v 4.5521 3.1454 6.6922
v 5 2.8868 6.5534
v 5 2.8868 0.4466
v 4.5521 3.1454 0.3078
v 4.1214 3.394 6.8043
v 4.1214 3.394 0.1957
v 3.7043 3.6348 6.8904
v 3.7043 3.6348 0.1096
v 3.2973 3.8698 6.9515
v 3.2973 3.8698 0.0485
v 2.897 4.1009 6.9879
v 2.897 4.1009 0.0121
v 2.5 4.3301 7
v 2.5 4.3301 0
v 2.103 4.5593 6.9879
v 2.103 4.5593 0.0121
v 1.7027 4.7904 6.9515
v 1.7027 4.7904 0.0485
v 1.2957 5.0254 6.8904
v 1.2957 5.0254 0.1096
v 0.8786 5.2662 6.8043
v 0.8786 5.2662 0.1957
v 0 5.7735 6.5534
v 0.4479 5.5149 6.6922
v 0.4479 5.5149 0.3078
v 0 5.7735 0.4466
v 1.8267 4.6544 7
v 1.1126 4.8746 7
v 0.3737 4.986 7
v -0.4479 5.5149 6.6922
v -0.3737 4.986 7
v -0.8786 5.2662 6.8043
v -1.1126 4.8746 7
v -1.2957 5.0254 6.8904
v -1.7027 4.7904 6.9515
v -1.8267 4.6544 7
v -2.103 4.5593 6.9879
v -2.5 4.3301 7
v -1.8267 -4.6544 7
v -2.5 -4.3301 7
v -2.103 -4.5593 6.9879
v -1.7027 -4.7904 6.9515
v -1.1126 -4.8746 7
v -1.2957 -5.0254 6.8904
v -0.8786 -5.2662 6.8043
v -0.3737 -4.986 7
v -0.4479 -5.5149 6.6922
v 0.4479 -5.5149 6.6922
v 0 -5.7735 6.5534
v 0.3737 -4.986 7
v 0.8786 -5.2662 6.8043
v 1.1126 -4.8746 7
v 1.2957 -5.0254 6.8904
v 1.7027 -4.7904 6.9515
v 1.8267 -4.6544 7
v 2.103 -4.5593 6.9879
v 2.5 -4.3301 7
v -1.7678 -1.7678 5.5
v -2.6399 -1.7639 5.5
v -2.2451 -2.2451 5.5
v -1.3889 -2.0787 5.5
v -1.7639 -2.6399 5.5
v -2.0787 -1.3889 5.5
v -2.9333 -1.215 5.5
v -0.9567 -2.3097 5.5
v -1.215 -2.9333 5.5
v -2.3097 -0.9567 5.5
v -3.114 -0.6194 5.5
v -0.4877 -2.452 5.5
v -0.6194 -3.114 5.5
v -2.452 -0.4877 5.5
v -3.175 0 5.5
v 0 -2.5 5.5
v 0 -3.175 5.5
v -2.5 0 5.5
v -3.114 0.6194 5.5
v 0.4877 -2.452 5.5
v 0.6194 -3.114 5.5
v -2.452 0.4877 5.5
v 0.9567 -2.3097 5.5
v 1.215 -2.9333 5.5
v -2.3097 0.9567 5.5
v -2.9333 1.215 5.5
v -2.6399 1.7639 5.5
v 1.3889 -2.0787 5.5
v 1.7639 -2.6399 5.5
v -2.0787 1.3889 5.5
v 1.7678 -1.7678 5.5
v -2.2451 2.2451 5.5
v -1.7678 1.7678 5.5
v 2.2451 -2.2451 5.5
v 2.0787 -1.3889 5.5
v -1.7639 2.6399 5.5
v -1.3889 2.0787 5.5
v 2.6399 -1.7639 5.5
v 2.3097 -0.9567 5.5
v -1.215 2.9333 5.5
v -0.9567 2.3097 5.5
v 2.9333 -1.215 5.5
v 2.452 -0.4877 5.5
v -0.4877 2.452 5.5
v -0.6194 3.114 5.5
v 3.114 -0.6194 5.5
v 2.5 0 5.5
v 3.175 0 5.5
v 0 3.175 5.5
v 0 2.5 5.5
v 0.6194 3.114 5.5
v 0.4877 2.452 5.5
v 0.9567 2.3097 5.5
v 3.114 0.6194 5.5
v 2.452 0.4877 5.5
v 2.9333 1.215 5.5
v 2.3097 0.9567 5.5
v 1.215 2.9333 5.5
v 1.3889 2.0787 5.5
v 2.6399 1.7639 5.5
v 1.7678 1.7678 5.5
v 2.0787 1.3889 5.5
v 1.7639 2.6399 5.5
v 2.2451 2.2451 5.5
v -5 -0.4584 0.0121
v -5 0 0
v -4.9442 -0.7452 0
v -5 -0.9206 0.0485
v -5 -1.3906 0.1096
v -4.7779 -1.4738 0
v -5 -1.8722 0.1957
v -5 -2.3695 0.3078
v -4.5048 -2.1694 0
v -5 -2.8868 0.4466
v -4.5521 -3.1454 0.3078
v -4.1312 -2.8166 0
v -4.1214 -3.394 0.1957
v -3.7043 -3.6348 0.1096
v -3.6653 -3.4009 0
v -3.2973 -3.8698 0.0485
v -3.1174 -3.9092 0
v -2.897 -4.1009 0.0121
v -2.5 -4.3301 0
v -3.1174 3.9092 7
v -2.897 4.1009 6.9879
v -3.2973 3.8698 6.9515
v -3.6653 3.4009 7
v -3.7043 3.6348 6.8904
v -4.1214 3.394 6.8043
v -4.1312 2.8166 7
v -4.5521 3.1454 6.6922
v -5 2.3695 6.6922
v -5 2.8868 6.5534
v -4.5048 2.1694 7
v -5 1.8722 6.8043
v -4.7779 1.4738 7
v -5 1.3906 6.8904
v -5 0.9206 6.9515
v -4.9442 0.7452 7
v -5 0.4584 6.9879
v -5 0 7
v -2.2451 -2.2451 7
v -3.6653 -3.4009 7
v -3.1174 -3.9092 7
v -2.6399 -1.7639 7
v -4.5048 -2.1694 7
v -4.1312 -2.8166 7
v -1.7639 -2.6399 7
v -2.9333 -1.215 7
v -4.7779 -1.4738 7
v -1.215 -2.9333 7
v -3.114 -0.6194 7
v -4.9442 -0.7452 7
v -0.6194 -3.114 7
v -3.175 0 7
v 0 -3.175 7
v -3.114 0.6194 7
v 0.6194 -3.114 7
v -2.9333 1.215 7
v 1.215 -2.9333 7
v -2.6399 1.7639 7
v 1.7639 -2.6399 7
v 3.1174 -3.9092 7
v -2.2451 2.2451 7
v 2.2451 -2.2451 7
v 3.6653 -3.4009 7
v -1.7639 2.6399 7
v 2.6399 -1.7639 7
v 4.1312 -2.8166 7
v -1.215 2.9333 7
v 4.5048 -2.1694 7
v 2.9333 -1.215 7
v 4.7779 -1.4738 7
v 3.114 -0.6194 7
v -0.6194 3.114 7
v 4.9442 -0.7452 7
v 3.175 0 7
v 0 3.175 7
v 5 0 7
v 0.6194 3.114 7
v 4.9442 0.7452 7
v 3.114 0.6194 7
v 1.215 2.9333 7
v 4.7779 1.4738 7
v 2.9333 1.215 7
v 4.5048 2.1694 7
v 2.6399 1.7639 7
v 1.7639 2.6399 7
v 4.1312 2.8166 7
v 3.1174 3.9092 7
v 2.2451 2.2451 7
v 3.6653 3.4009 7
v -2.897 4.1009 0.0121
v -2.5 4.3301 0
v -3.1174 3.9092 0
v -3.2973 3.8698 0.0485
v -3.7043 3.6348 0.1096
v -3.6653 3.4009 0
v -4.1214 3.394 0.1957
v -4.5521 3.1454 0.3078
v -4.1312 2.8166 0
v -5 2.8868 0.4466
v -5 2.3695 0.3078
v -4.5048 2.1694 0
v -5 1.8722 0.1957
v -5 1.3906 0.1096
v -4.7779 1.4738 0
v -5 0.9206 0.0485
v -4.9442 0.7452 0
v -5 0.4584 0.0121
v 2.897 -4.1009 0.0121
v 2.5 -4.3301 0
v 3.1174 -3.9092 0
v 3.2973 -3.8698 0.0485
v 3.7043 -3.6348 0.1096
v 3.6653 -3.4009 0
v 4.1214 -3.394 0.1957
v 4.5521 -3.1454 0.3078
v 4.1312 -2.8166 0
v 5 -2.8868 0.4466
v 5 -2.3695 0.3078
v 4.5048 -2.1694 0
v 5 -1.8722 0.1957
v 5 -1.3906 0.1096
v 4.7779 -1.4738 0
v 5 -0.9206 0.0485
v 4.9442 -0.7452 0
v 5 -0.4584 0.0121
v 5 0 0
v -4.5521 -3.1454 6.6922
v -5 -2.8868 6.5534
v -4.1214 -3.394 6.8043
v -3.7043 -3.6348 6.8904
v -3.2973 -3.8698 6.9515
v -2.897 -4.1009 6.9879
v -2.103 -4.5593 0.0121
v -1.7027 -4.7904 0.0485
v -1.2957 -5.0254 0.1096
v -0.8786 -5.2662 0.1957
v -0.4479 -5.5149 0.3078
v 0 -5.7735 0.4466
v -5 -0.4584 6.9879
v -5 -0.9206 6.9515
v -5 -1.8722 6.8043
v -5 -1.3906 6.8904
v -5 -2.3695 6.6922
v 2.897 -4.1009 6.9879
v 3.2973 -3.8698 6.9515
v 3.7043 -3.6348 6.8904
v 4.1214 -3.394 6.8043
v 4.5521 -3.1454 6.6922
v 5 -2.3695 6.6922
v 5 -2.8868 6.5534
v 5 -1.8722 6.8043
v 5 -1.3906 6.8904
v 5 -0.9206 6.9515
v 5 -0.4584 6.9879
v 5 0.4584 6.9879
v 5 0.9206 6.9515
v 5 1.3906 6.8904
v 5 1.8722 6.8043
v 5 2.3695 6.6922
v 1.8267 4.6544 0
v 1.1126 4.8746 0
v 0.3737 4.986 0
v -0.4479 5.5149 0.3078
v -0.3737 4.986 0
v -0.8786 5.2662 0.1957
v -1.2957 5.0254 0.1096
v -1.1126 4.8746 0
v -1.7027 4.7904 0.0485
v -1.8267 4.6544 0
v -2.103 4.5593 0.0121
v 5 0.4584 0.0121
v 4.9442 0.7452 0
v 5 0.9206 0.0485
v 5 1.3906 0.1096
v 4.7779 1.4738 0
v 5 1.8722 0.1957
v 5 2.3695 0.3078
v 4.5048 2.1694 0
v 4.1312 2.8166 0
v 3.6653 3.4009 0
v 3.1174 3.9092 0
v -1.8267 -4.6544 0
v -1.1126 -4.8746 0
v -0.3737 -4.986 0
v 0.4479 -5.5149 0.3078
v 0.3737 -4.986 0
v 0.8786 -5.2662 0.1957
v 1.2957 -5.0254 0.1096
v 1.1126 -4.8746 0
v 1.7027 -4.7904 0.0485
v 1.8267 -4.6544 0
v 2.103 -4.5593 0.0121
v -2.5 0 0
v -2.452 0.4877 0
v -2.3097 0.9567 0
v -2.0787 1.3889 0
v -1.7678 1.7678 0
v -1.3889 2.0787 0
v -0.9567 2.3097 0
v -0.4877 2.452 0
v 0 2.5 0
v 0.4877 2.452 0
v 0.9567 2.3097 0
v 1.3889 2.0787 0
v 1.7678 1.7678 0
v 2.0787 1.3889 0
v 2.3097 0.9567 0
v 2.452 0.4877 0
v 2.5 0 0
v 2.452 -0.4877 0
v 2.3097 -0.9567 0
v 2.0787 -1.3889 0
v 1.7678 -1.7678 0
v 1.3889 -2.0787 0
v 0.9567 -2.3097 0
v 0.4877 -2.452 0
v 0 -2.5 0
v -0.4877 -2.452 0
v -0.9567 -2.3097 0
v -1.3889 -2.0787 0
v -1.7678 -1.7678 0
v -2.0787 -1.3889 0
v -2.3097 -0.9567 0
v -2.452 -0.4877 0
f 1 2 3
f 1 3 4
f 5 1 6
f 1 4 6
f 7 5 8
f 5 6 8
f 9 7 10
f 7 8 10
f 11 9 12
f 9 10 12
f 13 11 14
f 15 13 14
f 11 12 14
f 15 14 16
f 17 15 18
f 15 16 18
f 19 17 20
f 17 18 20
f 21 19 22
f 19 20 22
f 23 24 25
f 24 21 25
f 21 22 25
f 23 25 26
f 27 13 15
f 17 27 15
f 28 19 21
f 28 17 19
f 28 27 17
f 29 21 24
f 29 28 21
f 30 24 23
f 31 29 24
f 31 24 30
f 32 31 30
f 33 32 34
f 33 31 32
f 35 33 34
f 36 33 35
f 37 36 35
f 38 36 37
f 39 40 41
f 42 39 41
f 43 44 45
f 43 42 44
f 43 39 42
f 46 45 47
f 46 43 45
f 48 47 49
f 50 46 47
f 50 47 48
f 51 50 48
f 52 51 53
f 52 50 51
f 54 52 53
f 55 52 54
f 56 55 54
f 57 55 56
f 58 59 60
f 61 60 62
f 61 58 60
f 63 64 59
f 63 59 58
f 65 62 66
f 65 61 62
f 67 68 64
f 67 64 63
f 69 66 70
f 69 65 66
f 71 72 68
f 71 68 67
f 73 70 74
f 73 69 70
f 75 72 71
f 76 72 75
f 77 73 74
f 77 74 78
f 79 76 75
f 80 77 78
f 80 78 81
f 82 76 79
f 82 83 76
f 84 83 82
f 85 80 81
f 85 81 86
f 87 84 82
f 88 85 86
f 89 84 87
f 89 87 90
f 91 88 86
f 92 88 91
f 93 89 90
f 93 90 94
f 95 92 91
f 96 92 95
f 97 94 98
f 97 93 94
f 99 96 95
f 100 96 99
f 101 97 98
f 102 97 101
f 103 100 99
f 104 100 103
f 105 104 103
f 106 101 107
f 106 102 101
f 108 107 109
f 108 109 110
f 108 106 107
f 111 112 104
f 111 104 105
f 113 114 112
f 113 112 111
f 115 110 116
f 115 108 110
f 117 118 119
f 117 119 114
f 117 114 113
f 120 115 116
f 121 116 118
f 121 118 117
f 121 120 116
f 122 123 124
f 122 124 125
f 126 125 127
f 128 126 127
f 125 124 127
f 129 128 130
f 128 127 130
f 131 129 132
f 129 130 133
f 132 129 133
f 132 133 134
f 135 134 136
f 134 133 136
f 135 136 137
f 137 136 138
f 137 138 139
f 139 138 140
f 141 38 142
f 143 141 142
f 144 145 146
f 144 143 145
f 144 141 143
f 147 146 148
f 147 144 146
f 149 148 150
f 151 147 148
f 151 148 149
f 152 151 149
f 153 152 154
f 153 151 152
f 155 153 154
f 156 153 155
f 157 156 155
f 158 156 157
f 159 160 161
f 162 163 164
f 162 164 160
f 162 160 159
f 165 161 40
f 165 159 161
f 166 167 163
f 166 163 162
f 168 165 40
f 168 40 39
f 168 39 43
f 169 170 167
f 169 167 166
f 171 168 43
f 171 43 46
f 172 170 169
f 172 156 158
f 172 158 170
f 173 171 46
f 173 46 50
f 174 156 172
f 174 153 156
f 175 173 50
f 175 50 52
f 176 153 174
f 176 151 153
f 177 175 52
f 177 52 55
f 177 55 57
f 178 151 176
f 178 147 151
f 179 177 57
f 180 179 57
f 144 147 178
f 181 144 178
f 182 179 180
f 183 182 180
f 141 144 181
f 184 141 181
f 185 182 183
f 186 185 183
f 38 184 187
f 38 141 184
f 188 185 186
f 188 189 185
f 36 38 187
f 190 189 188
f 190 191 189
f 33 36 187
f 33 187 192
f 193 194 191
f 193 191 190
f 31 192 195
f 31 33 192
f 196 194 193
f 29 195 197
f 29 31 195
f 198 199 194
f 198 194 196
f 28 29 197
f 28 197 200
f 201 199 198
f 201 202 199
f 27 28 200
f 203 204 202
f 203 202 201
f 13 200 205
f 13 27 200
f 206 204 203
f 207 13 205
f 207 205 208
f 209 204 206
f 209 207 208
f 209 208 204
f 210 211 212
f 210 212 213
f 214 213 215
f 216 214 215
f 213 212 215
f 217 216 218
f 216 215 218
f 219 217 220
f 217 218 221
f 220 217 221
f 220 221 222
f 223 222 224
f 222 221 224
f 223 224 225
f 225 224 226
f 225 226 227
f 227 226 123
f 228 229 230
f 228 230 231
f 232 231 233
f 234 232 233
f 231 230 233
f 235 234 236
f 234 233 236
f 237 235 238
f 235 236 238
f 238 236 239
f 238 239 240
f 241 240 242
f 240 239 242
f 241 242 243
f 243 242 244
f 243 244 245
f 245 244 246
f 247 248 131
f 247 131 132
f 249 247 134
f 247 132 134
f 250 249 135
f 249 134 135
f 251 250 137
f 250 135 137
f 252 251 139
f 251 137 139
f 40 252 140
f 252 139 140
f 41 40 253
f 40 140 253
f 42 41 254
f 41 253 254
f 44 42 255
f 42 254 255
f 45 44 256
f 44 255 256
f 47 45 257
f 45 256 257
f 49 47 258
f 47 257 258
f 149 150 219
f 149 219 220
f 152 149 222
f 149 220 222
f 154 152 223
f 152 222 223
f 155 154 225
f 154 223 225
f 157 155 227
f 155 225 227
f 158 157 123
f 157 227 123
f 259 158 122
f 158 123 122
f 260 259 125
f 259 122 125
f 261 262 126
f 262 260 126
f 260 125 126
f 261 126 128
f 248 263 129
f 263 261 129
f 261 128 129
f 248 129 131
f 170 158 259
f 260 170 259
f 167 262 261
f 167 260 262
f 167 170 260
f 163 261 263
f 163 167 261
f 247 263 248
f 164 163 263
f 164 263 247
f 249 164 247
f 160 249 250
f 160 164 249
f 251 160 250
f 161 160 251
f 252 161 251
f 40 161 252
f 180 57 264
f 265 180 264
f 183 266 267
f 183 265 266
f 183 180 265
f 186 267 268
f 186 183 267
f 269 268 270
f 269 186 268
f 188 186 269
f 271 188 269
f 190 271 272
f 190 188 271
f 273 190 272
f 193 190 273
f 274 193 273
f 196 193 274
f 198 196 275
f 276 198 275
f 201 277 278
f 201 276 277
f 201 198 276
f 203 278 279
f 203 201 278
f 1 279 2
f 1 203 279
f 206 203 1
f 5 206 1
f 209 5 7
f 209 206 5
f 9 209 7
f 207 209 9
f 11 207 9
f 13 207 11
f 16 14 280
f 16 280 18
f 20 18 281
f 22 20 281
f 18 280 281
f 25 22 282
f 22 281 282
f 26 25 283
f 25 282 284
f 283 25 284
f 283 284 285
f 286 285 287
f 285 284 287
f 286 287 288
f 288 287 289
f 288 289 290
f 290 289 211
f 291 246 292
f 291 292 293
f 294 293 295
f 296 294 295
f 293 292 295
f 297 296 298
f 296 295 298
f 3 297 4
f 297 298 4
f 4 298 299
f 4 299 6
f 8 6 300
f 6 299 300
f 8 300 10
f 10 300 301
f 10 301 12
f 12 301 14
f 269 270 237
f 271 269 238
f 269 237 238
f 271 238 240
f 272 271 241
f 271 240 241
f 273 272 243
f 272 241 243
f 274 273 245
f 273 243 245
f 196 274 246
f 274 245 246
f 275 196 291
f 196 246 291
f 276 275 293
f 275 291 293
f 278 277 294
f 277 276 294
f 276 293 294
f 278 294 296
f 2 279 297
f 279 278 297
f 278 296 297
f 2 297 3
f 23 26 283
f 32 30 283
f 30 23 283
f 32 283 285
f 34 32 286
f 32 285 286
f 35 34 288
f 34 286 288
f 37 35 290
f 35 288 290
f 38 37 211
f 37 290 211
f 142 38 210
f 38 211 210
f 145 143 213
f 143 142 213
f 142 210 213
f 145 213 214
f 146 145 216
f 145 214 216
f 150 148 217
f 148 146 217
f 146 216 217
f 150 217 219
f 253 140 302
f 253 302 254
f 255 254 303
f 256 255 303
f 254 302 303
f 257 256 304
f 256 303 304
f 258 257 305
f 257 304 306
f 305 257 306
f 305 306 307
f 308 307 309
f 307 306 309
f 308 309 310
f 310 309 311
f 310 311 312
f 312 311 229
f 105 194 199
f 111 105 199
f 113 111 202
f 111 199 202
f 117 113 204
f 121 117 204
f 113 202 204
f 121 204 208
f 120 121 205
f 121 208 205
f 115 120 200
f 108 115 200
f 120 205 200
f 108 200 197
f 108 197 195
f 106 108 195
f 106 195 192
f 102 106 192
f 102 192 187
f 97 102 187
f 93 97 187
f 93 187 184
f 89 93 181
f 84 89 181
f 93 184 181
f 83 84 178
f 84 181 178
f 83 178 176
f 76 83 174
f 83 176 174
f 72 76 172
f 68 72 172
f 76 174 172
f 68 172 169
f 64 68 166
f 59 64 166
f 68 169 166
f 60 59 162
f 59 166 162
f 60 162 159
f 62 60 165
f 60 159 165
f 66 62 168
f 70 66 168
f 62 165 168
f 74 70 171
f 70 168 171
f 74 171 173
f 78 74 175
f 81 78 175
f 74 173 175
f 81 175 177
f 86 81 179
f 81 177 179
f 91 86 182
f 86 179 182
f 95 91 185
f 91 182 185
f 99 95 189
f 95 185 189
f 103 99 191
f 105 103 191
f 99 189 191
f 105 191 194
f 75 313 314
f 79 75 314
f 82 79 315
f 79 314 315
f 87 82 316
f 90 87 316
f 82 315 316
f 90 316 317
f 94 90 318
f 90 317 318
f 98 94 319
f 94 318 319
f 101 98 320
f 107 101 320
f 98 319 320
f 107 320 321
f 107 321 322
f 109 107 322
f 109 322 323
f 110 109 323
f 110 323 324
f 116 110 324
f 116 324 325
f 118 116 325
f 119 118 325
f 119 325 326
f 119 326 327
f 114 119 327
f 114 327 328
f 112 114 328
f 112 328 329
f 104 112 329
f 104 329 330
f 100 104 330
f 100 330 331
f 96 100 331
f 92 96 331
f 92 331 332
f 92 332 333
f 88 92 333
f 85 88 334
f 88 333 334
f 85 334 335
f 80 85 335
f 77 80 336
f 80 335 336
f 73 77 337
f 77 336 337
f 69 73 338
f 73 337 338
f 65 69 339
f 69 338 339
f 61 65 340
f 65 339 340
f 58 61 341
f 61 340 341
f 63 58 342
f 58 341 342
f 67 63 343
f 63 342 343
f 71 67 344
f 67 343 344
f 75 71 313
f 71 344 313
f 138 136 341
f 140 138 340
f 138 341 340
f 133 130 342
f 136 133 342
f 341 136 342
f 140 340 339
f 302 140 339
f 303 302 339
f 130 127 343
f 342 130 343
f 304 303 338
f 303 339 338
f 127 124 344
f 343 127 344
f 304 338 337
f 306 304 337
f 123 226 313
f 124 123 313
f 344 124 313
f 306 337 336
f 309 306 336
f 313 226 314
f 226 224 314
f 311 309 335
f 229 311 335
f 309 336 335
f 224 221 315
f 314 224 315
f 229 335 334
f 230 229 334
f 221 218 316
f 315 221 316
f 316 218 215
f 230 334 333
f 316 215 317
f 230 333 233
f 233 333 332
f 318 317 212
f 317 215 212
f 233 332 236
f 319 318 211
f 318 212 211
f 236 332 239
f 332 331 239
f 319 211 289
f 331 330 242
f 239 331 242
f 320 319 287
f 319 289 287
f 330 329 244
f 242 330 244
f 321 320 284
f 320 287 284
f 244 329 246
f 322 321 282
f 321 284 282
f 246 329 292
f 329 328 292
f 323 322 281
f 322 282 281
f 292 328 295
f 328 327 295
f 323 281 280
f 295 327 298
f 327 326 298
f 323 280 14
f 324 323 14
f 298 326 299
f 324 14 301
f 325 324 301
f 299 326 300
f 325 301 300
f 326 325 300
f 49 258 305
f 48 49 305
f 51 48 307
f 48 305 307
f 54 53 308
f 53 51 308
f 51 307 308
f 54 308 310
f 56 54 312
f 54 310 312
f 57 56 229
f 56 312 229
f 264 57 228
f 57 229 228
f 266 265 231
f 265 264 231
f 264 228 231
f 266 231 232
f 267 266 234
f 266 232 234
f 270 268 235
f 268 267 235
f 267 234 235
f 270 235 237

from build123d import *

# Parameters (mm, degrees)
BOSS_EXTRUDE1_DEPTH       = 7
M6X1_0_TAPPED_HOLE1_D     = 5
M6X1_0_TAPPED_HOLE1_DEPTH = 15
M6X1_0_TAPPED_HOLE1_TIP   = 1.502151548
SKETCH5_R                 = 3.175
CUT_EXTRUDE1_DEPTH        = 1.5


with BuildPart() as part:
    # Sketch1 → Boss-Extrude1 (new body)
    with BuildSketch(Plane.XY):
        Polygon((0, 5.773502692), (-5, 2.886751346), (-5, -2.886751346), (0, -5.773502692), (5, -2.886751346), (5, 2.886751346), align=None)
    extrude(amount=BOSS_EXTRUDE1_DEPTH)

    # M6x1.0 Tapped Hole1
    with Locations(Plane.XY.offset(7)):
        with Locations((0, 0)):
            Hole(M6X1_0_TAPPED_HOLE1_D / 2, depth=M6X1_0_TAPPED_HOLE1_DEPTH)
            with Locations((0, 0, -(M6X1_0_TAPPED_HOLE1_DEPTH + M6X1_0_TAPPED_HOLE1_TIP / 2))):  # 118° drill point
                Cone(0, M6X1_0_TAPPED_HOLE1_D / 2, M6X1_0_TAPPED_HOLE1_TIP, mode=Mode.SUBTRACT)

    # Sketch4 → Cut-Revolve1 (revolve, cut)
    with BuildSketch(Plane(origin=(0, 0, 0), x_dir=(0, 0, -1), z_dir=(1, 0, 0)), mode=Mode.PRIVATE) as cut_revolve1_sk:
        Polygon((-6.553418013, 5.773502692), (-7, 5), (-7, 5.773502692), align=None)
        Polygon((0, 5.773502692), (-0.446581987, 5.773502692), (0, 5), align=None)
    revolve(cut_revolve1_sk.sketch.rotate(Axis((0, 0, 0), (0, 0, 1)), 270), axis=Axis((0, 0, 0), (0, 0, 1)), mode=Mode.SUBTRACT)

    # Sketch5 → Cut-Extrude1 (cut)
    with BuildSketch(Plane.XY.offset(7)):
        Circle(SKETCH5_R)
    extrude(amount=-CUT_EXTRUDE1_DEPTH, mode=Mode.SUBTRACT)


solid = part.part
